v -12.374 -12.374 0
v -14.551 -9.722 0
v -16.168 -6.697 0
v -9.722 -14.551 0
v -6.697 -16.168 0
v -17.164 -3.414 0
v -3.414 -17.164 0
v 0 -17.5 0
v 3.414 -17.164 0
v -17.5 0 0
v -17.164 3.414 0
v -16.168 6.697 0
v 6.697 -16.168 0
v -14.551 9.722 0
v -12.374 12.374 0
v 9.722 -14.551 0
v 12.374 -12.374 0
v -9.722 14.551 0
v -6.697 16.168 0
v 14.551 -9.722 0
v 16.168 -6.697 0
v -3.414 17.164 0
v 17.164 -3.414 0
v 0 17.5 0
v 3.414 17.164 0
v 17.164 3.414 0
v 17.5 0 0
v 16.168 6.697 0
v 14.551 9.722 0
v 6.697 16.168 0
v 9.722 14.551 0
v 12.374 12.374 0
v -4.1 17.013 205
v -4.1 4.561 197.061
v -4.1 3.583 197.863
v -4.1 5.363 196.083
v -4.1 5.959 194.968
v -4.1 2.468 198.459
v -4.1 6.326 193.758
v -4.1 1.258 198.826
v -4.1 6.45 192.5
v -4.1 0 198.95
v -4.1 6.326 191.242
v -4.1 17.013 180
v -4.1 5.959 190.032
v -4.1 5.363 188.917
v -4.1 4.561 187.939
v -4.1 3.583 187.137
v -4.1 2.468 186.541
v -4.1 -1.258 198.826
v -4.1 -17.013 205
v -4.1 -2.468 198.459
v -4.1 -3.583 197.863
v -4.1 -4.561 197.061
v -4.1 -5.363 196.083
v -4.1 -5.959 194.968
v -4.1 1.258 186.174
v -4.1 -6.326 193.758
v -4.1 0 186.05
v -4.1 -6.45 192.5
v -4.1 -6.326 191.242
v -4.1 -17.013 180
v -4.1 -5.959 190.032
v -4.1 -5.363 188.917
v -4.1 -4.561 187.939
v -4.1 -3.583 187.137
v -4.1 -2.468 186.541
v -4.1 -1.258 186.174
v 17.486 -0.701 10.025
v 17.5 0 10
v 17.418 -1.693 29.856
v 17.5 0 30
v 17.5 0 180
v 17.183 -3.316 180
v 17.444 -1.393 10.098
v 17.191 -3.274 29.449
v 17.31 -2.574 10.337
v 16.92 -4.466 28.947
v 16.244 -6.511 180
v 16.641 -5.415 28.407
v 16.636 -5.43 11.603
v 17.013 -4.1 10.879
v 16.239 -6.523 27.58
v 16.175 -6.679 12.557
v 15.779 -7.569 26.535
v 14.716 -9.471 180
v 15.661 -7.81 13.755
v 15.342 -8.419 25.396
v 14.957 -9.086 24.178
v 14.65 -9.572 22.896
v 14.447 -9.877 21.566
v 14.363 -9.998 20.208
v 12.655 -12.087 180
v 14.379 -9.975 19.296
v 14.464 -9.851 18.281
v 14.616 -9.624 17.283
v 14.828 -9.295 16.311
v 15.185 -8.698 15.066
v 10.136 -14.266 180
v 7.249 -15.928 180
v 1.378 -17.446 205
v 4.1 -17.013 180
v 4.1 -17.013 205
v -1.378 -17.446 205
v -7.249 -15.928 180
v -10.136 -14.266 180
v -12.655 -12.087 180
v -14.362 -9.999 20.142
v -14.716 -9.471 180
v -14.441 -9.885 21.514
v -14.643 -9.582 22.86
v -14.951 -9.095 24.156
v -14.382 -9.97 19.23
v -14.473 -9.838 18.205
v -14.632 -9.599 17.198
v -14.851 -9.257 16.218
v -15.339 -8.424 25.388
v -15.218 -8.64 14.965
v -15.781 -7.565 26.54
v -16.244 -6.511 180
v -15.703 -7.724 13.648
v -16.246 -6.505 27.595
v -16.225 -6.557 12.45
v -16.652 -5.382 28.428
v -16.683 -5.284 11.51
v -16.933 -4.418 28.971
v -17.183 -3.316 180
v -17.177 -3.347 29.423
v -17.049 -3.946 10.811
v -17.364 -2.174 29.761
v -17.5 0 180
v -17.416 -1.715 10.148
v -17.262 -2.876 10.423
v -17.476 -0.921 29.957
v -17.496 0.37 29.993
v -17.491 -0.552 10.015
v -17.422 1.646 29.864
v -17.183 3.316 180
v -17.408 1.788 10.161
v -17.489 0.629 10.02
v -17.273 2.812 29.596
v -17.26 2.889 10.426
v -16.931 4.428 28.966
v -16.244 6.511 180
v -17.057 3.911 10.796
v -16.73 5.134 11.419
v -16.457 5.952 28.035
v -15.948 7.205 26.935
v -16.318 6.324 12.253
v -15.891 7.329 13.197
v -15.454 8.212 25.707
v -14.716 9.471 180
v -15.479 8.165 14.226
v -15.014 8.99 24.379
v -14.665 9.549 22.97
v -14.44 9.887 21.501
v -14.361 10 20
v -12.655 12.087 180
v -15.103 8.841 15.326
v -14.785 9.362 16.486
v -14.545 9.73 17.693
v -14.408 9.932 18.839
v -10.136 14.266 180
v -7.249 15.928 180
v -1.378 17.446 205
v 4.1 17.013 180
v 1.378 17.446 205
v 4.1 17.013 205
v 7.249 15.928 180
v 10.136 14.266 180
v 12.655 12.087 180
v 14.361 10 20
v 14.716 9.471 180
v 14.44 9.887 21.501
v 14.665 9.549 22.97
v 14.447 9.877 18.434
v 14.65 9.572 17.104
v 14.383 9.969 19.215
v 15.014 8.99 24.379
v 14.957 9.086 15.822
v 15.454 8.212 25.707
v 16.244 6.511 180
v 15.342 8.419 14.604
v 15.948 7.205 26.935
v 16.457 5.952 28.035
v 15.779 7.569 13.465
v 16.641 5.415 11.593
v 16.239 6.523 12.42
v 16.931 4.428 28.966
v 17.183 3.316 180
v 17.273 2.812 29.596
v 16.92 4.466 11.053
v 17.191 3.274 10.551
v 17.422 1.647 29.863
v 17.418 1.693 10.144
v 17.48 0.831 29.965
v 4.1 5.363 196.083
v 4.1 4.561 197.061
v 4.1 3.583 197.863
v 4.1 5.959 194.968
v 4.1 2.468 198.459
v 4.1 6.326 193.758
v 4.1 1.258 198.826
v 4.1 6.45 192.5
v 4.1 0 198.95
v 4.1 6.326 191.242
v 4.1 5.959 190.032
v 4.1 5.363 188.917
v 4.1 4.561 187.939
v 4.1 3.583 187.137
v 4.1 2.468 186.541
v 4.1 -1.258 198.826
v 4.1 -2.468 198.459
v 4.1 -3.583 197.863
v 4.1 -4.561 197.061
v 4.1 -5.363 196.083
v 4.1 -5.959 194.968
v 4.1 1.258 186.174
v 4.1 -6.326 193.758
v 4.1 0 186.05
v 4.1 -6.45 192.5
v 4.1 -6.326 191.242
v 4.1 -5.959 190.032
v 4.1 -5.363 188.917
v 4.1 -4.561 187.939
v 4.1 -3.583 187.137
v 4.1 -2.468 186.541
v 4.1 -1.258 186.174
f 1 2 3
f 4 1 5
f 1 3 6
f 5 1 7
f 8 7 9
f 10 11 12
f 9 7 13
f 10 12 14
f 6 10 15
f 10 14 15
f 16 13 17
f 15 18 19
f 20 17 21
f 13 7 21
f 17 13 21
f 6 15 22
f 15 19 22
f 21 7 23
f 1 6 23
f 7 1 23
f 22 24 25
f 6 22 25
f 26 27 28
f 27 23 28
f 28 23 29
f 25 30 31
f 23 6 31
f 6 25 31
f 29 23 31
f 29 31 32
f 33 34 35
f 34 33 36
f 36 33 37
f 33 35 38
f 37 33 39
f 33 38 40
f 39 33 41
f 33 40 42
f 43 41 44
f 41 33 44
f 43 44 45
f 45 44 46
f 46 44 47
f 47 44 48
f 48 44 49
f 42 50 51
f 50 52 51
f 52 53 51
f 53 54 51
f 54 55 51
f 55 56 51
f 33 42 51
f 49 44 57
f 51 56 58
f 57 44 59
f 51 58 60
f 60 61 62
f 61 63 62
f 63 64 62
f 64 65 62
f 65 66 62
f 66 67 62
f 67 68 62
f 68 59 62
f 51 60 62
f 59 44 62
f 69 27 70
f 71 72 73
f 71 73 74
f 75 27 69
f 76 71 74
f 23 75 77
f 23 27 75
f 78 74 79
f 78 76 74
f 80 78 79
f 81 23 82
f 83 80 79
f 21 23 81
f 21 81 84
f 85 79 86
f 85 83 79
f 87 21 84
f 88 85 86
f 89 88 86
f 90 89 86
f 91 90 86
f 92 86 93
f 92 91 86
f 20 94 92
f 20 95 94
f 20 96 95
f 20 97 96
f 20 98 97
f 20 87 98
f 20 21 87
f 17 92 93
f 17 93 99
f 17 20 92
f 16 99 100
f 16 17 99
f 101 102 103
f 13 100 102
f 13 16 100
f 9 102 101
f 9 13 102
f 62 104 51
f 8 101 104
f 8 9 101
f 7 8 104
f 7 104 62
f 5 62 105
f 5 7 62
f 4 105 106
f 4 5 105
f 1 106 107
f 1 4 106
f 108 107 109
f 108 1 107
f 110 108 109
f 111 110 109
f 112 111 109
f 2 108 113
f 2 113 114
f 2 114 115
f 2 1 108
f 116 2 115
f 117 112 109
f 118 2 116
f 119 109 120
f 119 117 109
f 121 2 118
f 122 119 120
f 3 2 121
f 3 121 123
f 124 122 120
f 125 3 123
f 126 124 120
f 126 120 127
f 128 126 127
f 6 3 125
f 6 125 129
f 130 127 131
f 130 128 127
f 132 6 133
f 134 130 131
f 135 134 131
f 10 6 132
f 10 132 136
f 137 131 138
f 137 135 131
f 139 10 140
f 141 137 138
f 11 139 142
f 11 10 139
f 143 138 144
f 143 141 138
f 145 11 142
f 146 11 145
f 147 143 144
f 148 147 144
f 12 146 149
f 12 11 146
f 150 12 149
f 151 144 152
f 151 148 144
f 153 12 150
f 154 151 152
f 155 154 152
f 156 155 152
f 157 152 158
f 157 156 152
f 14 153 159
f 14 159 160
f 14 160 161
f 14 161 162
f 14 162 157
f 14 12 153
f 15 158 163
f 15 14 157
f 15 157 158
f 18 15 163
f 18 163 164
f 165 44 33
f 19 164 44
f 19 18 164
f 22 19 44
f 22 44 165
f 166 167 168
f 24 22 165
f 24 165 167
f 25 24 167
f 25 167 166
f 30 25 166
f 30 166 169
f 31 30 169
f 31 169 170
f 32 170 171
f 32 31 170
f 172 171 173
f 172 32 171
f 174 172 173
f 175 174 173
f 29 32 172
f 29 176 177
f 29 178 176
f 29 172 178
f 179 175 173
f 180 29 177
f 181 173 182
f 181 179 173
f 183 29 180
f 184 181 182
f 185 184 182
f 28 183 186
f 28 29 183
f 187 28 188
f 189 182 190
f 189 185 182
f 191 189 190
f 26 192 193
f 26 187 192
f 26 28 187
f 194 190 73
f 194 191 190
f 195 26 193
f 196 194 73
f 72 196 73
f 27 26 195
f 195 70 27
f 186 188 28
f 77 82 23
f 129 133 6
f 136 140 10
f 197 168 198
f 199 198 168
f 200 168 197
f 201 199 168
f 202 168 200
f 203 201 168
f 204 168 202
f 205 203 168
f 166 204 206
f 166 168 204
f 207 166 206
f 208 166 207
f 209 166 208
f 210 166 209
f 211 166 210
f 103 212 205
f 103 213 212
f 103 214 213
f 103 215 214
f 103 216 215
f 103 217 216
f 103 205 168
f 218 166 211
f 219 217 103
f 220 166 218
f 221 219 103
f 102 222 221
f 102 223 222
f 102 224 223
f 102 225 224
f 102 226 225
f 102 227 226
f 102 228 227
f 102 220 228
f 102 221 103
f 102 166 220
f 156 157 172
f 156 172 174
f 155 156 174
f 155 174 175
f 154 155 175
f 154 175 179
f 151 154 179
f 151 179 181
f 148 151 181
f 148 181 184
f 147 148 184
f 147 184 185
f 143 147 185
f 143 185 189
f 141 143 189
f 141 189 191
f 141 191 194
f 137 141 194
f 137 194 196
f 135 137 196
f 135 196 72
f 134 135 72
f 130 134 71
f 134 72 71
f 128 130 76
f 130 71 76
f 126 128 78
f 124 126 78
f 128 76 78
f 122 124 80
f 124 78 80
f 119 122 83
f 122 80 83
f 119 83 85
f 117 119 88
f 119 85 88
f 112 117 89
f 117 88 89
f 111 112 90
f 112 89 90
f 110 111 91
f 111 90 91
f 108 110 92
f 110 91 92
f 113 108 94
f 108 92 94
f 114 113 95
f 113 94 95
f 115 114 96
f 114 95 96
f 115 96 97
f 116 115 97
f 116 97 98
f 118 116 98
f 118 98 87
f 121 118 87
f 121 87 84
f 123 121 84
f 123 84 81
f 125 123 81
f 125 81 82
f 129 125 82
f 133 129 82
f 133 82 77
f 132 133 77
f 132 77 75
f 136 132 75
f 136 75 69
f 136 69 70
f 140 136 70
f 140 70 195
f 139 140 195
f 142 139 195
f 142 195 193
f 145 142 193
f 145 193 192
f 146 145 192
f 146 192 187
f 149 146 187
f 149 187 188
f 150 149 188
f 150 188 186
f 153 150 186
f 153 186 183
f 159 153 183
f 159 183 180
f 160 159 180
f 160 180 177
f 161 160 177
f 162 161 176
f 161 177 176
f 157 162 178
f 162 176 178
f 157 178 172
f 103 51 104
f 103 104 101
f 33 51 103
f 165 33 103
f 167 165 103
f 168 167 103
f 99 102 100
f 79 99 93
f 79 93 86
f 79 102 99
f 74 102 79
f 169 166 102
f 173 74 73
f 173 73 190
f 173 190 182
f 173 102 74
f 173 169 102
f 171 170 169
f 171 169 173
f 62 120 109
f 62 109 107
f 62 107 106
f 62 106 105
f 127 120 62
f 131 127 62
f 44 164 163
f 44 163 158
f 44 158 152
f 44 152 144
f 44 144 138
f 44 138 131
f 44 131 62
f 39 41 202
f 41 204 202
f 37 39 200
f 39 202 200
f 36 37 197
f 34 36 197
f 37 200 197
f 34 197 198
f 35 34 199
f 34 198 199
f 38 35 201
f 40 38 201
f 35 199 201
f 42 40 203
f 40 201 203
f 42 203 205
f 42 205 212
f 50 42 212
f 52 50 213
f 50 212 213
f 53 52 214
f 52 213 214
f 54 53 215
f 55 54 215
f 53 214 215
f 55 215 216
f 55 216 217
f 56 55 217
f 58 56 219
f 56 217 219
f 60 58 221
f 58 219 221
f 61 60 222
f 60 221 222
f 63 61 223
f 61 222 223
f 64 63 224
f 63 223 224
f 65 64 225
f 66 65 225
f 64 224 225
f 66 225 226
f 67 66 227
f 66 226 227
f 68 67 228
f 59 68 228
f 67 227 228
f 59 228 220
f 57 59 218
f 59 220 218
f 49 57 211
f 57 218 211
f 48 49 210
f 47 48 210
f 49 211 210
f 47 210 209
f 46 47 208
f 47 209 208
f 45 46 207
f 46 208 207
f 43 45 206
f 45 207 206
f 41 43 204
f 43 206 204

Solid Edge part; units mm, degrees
sketch "Sketch1" plane through (0, 0, 0) normal (0, 0, 1) x (1, 0, 0)
  circle A0 centre (0, 0) radius 17.5
  dimension "D1" = 35
extrude "Protrusion1" add sketch "Sketch1" along normal blind 180
sketch "Sketch2" plane through (0, 0, 180) normal (0, 0, 1) x (1, 0, 0)
  line L0 (-4.1, 17.0129) -> (-4.1, -17.0129)
  line L1 (4.1, 17.0129) -> (4.1, -17.0129)
  arc A0 (-4.1, 17.0129) -> (4.1, 17.0129) centre (0, 0) cw
  arc A1 (-4.1, -17.0129) -> (4.1, -17.0129) centre (0, 0) ccw
extrude "ExtrudedProtrusion_2" add sketch "Sketch2" along normal blind 25
sketch "Sketch3" plane through (4.1, 0, 212.5) normal (1, 0, 0) x (0, 1, 0)
  circle A0 centre (0, -20) radius 6.45
  dimension "D1" = 12.9
extrude "Cutout1" cut sketch "Sketch3" against normal up to next
sketch "Sketch4" plane through (0, 0, 0) normal (1, 0, 0) x (0, 1, 0)
  circle A0 centre (0, 20) radius 10
  dimension "D1" = 20
extrude "Cutout2" cut sketch "Sketch4" against normal through all and the other way through all
